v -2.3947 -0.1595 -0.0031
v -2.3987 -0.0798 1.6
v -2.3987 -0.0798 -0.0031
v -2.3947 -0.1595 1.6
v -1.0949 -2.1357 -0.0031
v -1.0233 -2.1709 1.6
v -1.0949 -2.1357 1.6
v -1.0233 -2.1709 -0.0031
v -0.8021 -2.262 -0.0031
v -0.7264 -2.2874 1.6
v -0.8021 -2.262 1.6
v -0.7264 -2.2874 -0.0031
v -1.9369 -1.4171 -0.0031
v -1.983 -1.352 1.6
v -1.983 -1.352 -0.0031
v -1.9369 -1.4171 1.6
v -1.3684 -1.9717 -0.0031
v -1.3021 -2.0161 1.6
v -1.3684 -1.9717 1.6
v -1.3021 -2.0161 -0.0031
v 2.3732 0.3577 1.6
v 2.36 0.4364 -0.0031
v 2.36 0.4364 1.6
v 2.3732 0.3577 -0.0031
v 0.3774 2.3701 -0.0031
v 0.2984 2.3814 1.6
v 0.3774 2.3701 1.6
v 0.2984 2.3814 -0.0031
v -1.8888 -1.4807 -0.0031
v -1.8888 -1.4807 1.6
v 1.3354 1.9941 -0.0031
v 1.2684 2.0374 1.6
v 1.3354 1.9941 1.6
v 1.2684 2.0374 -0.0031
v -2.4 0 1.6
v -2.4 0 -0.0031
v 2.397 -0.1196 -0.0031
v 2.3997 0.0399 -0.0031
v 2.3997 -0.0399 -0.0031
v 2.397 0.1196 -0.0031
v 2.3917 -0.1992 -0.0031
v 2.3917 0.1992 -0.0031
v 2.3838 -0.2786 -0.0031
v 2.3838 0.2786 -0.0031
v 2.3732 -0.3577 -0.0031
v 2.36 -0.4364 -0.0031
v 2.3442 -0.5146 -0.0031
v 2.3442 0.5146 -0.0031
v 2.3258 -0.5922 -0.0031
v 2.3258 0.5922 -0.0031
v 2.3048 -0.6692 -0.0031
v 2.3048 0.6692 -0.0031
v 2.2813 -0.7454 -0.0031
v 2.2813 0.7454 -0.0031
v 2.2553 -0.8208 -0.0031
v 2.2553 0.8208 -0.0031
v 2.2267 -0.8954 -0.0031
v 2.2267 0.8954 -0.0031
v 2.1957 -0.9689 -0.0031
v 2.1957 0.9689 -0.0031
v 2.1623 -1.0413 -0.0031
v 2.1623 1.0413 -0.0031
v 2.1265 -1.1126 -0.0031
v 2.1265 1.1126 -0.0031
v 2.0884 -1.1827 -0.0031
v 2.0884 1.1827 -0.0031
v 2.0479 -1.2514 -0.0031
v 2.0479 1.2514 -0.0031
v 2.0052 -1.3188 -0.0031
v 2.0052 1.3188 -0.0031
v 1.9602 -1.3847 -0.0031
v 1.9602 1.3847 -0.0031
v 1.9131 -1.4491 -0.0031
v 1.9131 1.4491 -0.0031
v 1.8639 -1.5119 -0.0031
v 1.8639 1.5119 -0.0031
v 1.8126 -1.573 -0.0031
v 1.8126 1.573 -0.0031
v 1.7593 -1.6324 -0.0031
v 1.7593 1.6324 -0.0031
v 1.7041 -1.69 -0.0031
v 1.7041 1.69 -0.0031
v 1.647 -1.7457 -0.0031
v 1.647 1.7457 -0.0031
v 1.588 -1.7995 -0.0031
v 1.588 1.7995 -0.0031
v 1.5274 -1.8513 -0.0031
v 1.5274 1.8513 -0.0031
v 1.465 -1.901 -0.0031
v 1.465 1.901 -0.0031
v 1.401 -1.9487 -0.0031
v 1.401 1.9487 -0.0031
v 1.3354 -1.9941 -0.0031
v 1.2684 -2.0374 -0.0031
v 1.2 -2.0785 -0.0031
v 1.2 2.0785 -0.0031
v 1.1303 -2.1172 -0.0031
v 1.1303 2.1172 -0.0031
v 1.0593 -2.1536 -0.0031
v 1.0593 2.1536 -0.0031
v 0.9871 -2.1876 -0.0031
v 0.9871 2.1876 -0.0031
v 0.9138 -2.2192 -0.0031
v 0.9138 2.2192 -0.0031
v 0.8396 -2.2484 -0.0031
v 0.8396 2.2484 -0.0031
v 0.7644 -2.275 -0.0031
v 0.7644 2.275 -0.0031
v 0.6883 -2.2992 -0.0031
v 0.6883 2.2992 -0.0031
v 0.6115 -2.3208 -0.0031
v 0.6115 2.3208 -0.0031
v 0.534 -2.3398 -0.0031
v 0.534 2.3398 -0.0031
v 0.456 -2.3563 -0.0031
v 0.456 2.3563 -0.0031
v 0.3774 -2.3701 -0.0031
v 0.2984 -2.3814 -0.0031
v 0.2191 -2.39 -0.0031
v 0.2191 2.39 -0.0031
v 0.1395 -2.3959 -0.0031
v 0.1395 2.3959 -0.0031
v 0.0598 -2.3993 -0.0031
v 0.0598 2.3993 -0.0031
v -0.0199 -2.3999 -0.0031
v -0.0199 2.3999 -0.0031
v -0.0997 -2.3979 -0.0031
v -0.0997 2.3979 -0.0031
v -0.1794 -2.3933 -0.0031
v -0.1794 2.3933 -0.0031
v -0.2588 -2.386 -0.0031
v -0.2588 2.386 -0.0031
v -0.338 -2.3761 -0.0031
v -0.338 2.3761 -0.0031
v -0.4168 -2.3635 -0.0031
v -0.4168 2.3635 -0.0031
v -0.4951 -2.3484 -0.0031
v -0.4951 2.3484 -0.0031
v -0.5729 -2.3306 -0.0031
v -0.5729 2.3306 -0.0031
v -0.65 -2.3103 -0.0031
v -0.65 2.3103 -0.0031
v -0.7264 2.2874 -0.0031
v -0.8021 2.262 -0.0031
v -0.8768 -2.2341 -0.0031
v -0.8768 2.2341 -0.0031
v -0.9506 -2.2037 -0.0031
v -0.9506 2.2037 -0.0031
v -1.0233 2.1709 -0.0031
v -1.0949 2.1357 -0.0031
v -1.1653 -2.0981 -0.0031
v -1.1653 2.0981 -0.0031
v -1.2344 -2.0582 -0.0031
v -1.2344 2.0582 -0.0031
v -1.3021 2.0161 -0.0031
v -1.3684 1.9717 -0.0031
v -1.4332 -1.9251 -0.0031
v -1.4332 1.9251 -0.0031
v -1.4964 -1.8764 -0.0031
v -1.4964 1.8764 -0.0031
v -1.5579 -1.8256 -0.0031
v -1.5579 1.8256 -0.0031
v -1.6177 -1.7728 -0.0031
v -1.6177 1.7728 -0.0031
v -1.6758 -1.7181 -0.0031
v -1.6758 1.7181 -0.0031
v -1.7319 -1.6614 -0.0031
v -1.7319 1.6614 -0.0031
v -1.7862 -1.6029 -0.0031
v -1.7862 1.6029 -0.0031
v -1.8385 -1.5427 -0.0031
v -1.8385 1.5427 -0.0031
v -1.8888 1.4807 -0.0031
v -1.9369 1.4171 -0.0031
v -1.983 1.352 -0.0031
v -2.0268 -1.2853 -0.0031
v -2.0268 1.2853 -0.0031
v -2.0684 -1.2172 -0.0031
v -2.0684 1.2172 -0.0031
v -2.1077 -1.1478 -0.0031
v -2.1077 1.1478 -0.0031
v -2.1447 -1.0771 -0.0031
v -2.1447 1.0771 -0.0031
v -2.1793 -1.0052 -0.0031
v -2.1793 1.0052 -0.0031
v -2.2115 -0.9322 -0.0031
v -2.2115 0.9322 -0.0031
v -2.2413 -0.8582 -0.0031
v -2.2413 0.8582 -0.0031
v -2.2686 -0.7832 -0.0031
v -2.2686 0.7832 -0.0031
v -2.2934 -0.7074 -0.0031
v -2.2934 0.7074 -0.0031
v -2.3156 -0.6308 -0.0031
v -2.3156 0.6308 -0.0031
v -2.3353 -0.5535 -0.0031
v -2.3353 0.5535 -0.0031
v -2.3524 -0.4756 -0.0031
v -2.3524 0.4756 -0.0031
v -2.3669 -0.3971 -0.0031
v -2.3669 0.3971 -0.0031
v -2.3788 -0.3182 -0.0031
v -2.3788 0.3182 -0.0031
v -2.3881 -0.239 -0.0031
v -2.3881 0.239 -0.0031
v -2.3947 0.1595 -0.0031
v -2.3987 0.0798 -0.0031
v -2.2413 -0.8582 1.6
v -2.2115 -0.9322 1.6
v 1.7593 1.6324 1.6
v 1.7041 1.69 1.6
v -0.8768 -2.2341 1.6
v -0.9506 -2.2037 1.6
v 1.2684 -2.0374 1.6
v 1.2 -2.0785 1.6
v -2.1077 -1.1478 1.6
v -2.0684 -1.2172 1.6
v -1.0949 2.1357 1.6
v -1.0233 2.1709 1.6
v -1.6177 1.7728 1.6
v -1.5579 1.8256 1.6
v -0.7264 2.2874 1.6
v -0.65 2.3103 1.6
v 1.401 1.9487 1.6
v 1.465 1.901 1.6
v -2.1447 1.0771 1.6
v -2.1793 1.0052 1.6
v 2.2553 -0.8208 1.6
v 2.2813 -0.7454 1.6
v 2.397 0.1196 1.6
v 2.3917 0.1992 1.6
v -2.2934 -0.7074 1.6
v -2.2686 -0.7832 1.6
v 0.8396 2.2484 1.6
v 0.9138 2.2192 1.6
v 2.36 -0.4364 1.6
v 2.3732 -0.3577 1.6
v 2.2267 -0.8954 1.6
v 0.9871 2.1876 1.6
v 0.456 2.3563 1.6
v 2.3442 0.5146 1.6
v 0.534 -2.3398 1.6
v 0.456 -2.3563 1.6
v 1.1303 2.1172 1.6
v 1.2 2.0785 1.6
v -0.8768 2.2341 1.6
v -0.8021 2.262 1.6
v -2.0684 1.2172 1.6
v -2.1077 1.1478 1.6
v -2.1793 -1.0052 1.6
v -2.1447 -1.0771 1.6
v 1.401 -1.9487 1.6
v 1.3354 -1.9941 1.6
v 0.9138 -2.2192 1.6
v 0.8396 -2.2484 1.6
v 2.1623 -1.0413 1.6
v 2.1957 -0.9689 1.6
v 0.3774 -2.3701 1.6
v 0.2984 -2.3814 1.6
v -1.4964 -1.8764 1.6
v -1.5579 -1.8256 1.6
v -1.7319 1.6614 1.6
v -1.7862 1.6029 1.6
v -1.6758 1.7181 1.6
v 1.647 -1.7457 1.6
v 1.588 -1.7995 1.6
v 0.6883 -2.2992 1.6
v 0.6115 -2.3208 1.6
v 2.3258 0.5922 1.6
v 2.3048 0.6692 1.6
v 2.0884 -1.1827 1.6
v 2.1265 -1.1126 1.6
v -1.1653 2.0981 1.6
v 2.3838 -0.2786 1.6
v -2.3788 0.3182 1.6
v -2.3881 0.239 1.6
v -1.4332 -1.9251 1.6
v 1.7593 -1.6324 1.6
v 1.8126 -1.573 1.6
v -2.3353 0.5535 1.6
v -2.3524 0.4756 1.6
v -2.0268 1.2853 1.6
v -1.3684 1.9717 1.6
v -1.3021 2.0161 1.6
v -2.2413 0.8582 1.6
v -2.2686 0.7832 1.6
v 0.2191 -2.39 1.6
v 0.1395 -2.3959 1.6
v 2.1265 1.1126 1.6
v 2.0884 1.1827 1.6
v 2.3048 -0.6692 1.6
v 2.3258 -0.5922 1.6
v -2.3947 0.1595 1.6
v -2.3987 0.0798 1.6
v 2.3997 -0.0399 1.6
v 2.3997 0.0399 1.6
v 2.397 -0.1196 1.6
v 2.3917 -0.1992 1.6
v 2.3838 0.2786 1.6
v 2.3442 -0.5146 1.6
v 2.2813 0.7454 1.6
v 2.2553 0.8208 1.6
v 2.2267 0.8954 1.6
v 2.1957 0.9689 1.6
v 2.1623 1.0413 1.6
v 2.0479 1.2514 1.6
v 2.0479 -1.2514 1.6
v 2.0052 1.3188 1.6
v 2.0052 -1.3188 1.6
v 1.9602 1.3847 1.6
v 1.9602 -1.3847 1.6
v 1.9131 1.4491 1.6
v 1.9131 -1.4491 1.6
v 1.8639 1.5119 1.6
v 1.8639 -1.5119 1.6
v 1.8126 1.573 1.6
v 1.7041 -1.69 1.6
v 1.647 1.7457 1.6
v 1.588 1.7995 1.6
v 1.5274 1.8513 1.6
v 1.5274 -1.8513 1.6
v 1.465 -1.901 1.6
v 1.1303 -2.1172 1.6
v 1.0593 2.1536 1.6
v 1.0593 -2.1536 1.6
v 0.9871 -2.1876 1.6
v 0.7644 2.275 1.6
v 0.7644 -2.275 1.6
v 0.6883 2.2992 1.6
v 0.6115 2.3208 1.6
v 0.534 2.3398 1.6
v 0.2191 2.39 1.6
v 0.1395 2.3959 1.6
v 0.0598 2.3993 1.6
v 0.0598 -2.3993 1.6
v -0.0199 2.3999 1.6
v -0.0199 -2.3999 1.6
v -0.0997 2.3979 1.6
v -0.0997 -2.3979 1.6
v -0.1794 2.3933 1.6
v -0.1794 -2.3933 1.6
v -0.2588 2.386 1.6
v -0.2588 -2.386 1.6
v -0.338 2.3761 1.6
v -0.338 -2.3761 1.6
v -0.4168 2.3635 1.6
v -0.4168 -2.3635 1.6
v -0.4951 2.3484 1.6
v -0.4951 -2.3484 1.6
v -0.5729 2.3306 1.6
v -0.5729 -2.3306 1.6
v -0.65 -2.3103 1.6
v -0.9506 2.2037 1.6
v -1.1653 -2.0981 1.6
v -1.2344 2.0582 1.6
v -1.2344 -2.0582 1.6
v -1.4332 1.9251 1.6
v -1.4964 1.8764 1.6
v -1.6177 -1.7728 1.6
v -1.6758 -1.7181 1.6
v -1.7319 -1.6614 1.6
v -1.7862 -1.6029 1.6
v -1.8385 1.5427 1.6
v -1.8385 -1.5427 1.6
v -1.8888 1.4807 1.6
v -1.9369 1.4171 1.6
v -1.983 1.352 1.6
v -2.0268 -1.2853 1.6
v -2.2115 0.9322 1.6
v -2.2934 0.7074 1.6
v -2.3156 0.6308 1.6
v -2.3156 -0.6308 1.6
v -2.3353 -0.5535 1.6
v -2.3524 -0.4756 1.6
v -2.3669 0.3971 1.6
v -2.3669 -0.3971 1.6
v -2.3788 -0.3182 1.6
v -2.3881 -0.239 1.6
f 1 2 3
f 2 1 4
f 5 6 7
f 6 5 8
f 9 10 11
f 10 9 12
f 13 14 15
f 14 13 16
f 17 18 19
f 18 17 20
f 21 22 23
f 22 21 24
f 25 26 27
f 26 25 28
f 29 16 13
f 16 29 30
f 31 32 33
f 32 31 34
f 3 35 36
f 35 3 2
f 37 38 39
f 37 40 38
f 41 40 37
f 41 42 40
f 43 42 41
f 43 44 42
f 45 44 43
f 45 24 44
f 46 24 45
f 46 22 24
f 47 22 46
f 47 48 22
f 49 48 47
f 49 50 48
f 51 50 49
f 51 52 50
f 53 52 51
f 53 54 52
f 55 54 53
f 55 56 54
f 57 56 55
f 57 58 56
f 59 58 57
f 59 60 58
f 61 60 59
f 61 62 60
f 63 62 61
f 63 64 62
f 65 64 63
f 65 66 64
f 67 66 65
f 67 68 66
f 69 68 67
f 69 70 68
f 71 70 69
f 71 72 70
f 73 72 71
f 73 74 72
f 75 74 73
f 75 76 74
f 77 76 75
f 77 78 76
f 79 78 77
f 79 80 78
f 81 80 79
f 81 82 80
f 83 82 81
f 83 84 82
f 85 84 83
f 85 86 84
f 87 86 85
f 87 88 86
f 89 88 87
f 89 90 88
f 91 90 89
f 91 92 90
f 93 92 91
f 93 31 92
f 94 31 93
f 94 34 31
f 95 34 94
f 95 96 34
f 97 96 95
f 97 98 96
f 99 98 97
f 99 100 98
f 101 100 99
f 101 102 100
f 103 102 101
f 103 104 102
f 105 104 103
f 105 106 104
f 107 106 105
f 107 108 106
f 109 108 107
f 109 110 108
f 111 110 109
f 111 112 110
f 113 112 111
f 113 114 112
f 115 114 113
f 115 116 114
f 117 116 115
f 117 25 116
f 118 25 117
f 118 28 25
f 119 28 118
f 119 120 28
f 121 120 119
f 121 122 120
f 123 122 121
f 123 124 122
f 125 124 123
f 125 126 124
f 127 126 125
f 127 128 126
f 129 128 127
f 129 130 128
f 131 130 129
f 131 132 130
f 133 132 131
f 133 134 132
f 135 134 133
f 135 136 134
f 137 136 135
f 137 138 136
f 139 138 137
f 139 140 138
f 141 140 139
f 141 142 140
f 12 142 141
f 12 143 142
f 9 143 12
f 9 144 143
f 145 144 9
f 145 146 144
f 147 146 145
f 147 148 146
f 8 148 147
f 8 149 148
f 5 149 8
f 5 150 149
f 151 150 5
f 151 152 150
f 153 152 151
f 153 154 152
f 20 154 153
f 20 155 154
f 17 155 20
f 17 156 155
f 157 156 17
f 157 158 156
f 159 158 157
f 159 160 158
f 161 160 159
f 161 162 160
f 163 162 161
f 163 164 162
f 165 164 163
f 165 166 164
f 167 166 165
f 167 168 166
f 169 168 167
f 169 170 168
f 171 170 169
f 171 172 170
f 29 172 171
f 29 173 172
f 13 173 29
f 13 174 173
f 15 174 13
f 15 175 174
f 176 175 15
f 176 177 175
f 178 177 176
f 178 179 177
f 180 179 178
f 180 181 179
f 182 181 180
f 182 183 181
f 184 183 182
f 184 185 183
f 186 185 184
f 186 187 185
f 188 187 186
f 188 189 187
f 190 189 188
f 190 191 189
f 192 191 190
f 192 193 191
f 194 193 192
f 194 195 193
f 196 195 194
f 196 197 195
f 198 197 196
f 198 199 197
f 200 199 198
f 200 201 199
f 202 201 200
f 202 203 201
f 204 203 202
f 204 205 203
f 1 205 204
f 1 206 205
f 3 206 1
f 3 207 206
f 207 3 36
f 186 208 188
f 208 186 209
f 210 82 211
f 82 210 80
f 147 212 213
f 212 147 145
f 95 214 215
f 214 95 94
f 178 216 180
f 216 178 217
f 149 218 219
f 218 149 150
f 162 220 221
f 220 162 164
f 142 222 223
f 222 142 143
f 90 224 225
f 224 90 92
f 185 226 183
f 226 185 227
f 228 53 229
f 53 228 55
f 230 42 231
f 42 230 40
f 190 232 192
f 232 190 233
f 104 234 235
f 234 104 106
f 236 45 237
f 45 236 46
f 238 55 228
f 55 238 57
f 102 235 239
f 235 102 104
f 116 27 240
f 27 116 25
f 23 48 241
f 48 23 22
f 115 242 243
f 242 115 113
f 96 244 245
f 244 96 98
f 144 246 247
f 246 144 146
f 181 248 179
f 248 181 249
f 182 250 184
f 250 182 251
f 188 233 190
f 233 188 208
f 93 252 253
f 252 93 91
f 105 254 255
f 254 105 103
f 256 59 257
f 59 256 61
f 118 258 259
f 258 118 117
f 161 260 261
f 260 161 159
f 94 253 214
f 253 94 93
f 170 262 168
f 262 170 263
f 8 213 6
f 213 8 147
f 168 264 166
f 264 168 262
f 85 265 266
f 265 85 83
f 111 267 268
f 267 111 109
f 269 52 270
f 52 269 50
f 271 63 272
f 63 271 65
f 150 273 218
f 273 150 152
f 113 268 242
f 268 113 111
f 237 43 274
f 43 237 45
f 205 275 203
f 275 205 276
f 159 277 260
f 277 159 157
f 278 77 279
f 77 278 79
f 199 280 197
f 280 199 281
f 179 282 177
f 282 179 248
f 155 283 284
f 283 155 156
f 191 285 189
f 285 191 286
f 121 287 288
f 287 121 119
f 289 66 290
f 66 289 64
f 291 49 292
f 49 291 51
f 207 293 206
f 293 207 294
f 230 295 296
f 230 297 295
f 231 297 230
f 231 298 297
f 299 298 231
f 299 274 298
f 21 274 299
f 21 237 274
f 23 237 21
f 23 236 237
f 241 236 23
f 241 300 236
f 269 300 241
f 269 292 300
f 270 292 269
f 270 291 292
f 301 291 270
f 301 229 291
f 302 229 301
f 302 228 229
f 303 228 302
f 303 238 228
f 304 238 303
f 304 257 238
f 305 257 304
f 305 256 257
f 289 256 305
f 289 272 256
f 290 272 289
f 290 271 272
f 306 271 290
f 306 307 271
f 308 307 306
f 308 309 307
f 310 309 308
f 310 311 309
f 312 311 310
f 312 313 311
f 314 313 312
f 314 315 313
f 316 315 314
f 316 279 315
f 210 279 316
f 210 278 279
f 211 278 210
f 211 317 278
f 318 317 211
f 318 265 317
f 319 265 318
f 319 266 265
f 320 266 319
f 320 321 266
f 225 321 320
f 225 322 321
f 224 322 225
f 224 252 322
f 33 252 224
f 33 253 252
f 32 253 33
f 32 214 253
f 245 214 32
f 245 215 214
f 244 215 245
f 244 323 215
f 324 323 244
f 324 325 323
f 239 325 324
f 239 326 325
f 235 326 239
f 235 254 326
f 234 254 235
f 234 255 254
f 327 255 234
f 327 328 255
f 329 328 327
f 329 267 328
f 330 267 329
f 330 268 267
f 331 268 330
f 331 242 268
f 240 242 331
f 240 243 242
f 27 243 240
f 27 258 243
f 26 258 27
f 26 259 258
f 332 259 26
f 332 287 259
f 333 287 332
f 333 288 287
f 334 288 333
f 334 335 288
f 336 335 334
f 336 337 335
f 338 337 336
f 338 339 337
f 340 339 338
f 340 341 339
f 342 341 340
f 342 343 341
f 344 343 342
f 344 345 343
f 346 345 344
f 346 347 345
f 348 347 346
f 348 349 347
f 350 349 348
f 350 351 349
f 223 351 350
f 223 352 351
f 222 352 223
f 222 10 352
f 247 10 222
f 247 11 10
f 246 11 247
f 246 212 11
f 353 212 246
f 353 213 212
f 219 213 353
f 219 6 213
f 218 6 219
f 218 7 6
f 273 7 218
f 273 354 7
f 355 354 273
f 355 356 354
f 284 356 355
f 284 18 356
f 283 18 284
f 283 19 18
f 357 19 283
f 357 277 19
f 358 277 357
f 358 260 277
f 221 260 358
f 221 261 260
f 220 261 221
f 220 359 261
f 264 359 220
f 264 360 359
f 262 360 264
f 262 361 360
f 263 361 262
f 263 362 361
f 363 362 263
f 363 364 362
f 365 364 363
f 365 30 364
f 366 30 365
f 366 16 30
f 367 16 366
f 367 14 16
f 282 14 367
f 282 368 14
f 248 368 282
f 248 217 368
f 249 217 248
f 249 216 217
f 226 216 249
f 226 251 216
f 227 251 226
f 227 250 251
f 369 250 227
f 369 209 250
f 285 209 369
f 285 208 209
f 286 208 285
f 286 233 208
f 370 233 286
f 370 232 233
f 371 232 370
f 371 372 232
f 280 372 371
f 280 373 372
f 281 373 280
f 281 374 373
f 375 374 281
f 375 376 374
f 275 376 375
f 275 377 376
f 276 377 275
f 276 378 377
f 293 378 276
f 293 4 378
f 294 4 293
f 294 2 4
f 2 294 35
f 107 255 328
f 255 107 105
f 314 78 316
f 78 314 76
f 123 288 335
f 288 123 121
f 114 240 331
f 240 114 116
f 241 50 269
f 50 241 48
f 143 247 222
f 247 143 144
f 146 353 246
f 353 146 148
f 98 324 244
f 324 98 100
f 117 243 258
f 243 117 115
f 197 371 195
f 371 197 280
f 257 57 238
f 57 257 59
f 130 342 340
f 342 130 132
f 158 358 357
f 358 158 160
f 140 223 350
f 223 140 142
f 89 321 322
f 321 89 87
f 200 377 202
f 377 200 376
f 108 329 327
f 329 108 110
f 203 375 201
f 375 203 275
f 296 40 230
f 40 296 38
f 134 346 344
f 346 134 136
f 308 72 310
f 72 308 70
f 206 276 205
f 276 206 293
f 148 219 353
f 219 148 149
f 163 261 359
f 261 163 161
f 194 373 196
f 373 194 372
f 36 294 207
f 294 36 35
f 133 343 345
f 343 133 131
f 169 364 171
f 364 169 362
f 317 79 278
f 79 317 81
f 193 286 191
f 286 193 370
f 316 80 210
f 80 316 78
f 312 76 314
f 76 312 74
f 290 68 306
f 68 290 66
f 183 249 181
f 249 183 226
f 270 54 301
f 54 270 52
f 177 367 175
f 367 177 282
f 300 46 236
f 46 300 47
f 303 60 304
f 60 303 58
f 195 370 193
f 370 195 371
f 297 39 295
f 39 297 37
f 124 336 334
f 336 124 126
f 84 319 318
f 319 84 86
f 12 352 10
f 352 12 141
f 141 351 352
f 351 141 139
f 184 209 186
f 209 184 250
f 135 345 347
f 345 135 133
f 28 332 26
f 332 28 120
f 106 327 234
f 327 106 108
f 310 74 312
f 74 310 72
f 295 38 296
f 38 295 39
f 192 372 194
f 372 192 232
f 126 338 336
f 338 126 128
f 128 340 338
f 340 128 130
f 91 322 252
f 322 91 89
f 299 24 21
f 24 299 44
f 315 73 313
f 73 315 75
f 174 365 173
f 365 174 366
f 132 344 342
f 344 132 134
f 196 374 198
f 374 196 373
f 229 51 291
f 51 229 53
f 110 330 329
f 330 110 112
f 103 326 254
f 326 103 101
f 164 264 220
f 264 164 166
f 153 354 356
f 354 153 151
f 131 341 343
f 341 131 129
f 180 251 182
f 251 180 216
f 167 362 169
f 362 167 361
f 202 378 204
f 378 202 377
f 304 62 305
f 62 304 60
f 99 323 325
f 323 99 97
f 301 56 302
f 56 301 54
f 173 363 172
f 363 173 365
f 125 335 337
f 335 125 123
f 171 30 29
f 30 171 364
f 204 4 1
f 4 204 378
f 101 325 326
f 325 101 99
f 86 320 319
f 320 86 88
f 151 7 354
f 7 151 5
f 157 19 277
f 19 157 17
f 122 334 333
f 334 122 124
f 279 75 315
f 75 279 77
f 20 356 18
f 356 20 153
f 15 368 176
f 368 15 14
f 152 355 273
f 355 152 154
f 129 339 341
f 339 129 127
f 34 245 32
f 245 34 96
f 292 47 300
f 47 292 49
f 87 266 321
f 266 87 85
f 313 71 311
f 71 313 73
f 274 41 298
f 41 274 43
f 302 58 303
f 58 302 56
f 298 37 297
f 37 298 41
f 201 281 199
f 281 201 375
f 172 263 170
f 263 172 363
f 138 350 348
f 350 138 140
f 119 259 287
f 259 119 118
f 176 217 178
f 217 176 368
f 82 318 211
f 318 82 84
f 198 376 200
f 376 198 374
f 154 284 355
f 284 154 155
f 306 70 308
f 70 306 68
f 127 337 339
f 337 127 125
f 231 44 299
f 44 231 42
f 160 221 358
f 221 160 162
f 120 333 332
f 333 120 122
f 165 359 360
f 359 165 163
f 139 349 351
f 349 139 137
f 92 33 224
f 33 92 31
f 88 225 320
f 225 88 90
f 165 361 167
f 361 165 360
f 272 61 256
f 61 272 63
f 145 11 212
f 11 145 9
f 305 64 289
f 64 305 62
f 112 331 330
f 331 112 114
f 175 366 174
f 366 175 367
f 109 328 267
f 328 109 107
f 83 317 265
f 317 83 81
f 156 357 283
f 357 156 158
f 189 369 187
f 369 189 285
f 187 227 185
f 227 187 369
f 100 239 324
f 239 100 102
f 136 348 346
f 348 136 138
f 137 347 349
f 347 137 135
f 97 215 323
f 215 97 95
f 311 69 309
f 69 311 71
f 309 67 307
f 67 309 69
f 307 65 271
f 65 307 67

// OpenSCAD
use <../lib.scad>
use <3005ptu.scad>
$fa=1; $fs=0.2;
function ldraw_lib__3005_u(realsolid=false) = [
// 0 ~Moved to 3005ptu
// 0 Name: 3005-u.dat
// 0 Author: [PTadmin]
// 0 !LDRAW_ORG Part UPDATE 2004-02
// 0 !LICENSE Licensed under CC BY 4.0 : see CAreadme.txt
// 
// 0 BFC CERTIFY CCW
  [0,"BFC","CERTIFY"],
  [0,"BFC","CCW"],
// 
// 0 !HISTORY 1998-12-15 [PTadmin] Official Update 1998-10
// 0 !HISTORY 2004-04-22 [PTadmin] Official Update 2004-02
// 0 !HISTORY 2007-05-11 [PTadmin] Header formatted for Contributor Agreement
// 0 !HISTORY 2008-07-01 [PTadmin] Official Update 2008-01
// 
// 
// 1 16 0 0 0 1 0 0 0 1 0 0 0 1 3005ptu.dat
  [1,16,0,0,0,1,0,0,0,1,0,0,0,1, ldraw_lib__3005ptu(realsolid)],
];
module ldraw_lib__3005_u(step=0, col=false, unit=2/5, alt=false, line=0.2, solid=!$preview)
    makepoly(ldraw_lib__3005_u(solid), step=step, col=col, unit=unit, alt=alt, line=line, solid=solid);
ldraw_lib__3005_u(line=0.2);
